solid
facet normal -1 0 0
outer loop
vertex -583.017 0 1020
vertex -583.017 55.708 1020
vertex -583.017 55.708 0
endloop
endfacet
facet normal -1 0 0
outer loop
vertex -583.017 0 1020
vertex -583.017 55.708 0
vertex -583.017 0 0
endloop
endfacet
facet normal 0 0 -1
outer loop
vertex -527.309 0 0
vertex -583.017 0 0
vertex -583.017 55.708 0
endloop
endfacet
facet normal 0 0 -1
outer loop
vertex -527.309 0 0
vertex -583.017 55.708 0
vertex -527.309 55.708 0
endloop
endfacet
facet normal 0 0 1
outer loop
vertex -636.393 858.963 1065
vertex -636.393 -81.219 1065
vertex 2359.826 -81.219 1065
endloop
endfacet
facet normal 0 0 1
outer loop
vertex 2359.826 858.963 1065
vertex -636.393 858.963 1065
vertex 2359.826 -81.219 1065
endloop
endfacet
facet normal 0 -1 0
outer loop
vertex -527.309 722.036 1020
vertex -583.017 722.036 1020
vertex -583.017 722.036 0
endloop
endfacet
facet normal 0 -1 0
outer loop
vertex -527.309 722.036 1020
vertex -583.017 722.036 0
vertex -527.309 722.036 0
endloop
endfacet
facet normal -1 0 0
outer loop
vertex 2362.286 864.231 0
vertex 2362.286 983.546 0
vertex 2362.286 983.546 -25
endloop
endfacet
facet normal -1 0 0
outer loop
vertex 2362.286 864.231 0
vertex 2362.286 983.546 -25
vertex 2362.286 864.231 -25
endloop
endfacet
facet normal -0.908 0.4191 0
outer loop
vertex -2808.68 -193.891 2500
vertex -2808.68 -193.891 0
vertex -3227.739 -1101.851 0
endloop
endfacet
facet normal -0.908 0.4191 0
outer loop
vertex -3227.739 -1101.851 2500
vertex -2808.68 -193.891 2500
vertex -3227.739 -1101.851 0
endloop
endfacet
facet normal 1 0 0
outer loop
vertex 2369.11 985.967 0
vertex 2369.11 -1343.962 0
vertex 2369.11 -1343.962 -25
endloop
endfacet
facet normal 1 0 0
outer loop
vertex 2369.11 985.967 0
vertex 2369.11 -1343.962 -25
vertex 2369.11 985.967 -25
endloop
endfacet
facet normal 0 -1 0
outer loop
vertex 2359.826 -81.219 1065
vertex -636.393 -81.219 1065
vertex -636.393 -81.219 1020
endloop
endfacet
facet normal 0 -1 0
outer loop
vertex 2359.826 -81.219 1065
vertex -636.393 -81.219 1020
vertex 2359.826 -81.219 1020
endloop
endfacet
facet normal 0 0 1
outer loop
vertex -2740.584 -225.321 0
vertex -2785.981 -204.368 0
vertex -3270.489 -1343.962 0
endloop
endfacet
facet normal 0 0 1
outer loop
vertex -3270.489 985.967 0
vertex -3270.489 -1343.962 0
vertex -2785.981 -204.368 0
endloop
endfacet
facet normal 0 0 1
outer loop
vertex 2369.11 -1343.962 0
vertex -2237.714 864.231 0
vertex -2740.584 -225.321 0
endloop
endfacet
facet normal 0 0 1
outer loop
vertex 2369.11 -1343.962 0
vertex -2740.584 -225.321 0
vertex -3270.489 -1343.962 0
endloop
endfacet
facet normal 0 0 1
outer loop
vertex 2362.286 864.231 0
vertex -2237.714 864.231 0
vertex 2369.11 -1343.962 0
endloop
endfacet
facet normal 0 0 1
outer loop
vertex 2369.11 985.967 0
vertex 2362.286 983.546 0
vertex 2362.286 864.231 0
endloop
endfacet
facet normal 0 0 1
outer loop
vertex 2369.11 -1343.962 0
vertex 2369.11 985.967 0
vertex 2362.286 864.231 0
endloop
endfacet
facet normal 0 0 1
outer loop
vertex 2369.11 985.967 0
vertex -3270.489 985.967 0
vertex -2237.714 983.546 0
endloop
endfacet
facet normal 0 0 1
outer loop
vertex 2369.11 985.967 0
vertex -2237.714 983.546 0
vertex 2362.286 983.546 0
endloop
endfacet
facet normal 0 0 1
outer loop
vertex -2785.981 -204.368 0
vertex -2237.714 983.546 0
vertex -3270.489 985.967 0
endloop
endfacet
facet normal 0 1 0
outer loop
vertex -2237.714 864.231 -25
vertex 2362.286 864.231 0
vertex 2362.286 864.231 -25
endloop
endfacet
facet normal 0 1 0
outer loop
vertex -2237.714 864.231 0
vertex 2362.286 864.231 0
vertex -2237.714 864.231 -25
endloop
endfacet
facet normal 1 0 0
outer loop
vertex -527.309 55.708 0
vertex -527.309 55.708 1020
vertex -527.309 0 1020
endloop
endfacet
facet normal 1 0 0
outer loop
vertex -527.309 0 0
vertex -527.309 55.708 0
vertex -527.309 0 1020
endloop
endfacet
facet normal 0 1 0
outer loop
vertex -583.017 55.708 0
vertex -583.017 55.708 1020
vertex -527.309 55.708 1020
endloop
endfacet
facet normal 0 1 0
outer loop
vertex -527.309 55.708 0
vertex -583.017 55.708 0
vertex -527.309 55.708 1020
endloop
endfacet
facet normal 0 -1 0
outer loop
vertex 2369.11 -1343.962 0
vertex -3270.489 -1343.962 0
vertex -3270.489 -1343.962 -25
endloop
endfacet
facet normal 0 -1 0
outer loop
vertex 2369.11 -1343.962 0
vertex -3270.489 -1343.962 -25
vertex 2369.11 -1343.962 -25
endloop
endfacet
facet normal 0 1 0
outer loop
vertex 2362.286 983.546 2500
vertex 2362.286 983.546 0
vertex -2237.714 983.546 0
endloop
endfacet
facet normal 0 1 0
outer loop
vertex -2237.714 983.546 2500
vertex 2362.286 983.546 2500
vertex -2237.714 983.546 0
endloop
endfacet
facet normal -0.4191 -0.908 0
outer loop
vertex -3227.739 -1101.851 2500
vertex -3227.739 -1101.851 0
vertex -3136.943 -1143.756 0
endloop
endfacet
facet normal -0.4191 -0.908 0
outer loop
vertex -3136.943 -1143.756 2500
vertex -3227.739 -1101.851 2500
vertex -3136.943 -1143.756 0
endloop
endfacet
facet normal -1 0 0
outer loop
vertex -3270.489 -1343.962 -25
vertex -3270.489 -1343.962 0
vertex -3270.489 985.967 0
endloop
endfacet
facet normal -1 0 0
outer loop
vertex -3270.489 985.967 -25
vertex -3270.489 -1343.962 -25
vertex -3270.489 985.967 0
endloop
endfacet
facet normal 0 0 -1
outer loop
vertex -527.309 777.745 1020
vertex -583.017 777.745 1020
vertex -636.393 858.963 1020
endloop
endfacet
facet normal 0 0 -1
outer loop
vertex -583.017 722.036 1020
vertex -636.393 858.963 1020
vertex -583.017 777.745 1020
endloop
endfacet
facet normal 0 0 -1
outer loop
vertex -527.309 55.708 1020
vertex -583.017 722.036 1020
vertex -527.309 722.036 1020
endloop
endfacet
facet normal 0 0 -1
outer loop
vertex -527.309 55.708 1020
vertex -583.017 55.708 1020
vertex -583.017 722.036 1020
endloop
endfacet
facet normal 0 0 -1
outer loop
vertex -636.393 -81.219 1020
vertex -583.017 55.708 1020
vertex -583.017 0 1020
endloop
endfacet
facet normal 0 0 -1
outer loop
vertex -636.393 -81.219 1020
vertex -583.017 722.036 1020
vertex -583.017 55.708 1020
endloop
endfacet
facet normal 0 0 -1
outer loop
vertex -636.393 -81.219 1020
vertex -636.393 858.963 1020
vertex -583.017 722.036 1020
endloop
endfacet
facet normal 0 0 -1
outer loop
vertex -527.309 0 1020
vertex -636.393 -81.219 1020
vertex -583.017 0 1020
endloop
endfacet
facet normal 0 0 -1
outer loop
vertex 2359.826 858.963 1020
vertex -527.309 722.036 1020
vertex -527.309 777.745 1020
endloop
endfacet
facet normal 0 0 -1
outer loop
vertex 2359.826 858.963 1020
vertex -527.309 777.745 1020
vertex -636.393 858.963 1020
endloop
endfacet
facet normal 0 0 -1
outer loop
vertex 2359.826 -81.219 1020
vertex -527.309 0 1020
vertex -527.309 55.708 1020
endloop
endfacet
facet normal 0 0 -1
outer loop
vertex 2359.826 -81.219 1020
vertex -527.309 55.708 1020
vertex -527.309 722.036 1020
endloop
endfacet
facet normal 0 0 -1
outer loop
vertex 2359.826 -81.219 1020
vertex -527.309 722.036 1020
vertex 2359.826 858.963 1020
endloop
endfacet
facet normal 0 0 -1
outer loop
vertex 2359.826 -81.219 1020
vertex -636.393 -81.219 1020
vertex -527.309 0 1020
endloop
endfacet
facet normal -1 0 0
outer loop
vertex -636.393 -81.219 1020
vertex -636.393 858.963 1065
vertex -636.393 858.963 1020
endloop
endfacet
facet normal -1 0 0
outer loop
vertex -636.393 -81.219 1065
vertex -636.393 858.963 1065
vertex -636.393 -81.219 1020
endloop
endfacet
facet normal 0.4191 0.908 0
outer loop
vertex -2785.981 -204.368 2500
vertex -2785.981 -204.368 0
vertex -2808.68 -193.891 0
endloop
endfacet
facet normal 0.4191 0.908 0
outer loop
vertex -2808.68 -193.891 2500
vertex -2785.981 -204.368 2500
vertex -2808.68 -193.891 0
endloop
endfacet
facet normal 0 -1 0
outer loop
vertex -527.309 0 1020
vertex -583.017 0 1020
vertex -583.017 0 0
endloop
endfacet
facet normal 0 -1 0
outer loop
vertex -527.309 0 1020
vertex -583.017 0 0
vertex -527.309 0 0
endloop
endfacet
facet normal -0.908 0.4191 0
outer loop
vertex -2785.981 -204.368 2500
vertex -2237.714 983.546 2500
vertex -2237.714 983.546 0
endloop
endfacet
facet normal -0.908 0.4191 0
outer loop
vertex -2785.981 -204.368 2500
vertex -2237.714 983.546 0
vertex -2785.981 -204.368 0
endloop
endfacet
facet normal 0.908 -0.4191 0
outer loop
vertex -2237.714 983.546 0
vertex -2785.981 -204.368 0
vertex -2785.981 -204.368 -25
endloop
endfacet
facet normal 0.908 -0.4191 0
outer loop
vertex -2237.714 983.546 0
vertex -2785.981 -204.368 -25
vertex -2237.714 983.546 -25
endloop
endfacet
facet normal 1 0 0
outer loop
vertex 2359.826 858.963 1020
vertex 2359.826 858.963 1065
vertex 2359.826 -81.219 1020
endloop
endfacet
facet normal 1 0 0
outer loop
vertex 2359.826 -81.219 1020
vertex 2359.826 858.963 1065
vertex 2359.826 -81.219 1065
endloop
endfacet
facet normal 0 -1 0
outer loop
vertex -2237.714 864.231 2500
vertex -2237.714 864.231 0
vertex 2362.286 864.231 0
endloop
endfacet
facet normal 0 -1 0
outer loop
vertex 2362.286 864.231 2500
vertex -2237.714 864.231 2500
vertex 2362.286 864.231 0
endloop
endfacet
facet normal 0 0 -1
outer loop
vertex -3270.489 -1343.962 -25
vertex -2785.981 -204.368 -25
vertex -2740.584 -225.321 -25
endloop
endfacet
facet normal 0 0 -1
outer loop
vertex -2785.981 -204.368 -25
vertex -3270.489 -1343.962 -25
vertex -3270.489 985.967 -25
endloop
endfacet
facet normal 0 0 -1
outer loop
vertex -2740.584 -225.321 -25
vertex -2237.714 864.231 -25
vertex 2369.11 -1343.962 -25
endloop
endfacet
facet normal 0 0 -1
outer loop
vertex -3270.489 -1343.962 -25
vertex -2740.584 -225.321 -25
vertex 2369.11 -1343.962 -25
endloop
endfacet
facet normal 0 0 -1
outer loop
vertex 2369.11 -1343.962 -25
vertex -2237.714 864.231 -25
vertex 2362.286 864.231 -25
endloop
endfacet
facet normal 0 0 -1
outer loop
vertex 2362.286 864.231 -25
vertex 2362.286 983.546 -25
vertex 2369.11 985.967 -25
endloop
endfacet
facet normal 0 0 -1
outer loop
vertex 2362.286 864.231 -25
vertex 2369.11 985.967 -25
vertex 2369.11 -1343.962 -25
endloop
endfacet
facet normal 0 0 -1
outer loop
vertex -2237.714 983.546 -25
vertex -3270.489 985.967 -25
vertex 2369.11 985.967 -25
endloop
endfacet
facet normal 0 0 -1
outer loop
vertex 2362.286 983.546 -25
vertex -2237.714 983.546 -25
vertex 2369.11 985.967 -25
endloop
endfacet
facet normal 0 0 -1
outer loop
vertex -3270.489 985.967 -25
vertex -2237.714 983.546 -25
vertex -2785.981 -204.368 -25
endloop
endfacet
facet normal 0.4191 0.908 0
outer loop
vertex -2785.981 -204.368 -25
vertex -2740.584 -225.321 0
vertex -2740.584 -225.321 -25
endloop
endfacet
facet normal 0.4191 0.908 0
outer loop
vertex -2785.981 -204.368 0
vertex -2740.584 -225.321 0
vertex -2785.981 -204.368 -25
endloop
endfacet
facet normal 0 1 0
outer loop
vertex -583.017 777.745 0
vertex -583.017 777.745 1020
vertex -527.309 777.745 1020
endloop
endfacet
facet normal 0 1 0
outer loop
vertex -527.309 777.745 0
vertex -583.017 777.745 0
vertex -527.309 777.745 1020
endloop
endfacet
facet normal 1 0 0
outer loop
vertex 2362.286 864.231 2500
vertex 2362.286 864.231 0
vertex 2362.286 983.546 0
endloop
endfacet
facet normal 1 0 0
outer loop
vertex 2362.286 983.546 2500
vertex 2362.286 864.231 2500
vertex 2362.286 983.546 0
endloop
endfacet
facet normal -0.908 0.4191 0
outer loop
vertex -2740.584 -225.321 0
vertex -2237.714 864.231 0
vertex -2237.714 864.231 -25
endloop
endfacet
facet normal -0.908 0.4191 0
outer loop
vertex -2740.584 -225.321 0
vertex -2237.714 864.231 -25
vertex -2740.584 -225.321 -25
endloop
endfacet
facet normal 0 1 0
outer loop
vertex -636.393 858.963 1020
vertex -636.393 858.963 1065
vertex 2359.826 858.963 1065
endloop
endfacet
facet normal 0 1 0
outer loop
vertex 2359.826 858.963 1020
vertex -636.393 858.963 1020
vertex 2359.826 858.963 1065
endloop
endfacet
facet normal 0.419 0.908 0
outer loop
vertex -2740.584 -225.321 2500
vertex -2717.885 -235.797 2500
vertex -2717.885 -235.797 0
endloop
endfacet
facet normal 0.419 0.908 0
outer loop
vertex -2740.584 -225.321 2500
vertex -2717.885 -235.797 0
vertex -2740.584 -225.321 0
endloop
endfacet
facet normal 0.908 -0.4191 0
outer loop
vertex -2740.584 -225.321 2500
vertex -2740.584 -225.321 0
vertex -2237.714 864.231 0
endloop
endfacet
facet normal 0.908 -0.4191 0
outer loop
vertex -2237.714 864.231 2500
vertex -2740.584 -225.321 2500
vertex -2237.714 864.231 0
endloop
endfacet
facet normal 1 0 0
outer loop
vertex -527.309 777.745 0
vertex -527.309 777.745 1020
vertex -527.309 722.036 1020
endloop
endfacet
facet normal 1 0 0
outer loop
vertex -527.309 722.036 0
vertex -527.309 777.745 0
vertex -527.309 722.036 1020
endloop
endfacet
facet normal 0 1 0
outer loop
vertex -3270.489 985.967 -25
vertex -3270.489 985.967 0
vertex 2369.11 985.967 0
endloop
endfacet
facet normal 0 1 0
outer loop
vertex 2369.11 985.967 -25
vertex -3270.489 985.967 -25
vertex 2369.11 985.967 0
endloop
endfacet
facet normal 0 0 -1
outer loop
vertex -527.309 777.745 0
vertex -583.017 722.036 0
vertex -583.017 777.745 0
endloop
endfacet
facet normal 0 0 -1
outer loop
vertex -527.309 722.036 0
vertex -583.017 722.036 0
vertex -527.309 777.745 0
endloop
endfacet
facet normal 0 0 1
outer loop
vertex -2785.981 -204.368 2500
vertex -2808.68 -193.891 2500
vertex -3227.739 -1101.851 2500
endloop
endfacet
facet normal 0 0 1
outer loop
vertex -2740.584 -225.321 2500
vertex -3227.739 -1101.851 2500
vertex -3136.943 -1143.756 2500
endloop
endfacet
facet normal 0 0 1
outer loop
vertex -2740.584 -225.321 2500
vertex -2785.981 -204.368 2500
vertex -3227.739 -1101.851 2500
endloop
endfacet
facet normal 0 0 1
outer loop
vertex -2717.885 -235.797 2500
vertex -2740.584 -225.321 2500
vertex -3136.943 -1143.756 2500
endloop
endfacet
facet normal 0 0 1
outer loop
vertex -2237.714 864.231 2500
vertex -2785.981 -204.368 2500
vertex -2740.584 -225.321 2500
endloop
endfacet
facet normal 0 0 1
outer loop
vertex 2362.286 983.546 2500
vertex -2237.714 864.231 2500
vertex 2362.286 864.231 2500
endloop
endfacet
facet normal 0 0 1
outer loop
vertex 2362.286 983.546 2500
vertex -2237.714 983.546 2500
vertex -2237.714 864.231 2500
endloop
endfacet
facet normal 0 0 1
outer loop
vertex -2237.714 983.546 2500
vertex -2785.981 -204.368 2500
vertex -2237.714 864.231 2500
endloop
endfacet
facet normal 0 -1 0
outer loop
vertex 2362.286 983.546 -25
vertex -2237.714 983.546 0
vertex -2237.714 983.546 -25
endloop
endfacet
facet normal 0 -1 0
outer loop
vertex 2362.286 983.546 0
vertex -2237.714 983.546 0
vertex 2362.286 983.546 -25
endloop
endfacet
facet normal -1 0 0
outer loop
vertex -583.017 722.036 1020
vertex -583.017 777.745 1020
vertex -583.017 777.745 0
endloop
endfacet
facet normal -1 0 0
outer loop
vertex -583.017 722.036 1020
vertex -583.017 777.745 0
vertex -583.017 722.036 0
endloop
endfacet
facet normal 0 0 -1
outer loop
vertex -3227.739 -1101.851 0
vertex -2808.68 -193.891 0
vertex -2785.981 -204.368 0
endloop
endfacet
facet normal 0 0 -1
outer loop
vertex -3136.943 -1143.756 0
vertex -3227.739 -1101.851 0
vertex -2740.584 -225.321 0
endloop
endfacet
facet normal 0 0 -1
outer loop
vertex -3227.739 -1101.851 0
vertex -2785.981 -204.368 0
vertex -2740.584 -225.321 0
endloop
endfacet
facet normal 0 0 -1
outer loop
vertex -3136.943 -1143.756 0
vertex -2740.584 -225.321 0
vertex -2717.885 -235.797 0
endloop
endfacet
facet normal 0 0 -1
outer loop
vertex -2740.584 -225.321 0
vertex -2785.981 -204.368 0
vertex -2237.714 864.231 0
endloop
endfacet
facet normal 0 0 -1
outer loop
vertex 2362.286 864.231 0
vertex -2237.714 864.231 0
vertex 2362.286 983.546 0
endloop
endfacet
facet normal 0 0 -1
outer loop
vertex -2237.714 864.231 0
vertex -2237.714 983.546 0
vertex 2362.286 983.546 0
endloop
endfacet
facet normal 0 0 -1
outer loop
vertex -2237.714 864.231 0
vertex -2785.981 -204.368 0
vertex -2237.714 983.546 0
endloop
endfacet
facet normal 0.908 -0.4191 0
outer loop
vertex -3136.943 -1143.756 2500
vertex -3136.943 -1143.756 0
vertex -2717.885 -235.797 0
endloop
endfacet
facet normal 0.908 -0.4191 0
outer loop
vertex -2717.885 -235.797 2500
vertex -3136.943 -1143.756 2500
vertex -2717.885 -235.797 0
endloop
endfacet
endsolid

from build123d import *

# Parameters (mm, degrees)
F1_DEPTH = 2500
F3_W     = 2996.2194561958
F3_H     = 940.1818439364
F4_DEPTH = 45
F5_W     = 5639.598608017
F5_H     = 2329.9290537834
F6_DEPTH = 25
F7_W     = 55.7084493339
F7_H     = 55.7084493339
F8_DEPTH = 1020


with BuildPart() as f1:
    # F0 (on Top) → F1 (new body)
    with BuildSketch(Plane.XY):
        Polygon((-2237.7137064844, 864.2307190811), (-637.7137064844, 864.2307190811), (2362.2862935156, 864.2307190811), (2362.2862935156, 983.5458946084), (-2237.7137064844, 983.5458946084), (-2785.9814886635, -204.3676334463), (-2740.5835194385, -225.3205423194), align=None)
        Polygon((-2717.884534826, -235.796996756), (-2740.5835194385, -225.3205423194), (-2785.9814886635, -204.3676334463), (-2808.680473276, -193.8911790098), (-3227.7386507378, -1101.8505635102), (-3136.9427122877, -1143.7563812564), align=None)
    extrude(amount=F1_DEPTH)


with BuildPart() as f4:
    # F3 (on offset) → F4 (new body)
    with BuildSketch(Plane(origin=(0, 0, 1065), x_dir=(1, 0, 0), z_dir=(0, 0, -1))):
        with Locations((861.7163598537, -388.8723291457)):
            Rectangle(F3_W, F3_H)
    extrude(amount=F4_DEPTH)

    # F7 (on face) → F8 (join, through all)
    with BuildSketch(Plane(origin=(0, 0, 1020), x_dir=(1, 0, 0), z_dir=(0, 0, -1))):
        with Locations((-555.1630649716, -27.854224667)):
            Rectangle(F7_W, F7_H)
        with Locations((-555.1630649716, -749.8904336244)):
            Rectangle(F7_W, F7_H)
    extrude(amount=F8_DEPTH)


with BuildPart() as f6:
    # F5 (on face) → F6 (new body)
    with BuildSketch(Plane.XY):
        with Locations((-450.6896734238, -178.9979040623)):
            Rectangle(F5_W, F5_H)
        Polygon((-637.7137064844, 864.2307190811), (-2237.7137064844, 864.2307190811), (-2740.5835194385, -225.3205423194), (-2785.9814886635, -204.3676334463), (-2237.7137064844, 983.5458946084), (2362.2862935156, 983.5458946084), (2362.2862935156, 864.2307190811), align=None, mode=Mode.SUBTRACT)
    extrude(amount=-F6_DEPTH)


solid = Compound([f1.part, f4.part, f6.part])
